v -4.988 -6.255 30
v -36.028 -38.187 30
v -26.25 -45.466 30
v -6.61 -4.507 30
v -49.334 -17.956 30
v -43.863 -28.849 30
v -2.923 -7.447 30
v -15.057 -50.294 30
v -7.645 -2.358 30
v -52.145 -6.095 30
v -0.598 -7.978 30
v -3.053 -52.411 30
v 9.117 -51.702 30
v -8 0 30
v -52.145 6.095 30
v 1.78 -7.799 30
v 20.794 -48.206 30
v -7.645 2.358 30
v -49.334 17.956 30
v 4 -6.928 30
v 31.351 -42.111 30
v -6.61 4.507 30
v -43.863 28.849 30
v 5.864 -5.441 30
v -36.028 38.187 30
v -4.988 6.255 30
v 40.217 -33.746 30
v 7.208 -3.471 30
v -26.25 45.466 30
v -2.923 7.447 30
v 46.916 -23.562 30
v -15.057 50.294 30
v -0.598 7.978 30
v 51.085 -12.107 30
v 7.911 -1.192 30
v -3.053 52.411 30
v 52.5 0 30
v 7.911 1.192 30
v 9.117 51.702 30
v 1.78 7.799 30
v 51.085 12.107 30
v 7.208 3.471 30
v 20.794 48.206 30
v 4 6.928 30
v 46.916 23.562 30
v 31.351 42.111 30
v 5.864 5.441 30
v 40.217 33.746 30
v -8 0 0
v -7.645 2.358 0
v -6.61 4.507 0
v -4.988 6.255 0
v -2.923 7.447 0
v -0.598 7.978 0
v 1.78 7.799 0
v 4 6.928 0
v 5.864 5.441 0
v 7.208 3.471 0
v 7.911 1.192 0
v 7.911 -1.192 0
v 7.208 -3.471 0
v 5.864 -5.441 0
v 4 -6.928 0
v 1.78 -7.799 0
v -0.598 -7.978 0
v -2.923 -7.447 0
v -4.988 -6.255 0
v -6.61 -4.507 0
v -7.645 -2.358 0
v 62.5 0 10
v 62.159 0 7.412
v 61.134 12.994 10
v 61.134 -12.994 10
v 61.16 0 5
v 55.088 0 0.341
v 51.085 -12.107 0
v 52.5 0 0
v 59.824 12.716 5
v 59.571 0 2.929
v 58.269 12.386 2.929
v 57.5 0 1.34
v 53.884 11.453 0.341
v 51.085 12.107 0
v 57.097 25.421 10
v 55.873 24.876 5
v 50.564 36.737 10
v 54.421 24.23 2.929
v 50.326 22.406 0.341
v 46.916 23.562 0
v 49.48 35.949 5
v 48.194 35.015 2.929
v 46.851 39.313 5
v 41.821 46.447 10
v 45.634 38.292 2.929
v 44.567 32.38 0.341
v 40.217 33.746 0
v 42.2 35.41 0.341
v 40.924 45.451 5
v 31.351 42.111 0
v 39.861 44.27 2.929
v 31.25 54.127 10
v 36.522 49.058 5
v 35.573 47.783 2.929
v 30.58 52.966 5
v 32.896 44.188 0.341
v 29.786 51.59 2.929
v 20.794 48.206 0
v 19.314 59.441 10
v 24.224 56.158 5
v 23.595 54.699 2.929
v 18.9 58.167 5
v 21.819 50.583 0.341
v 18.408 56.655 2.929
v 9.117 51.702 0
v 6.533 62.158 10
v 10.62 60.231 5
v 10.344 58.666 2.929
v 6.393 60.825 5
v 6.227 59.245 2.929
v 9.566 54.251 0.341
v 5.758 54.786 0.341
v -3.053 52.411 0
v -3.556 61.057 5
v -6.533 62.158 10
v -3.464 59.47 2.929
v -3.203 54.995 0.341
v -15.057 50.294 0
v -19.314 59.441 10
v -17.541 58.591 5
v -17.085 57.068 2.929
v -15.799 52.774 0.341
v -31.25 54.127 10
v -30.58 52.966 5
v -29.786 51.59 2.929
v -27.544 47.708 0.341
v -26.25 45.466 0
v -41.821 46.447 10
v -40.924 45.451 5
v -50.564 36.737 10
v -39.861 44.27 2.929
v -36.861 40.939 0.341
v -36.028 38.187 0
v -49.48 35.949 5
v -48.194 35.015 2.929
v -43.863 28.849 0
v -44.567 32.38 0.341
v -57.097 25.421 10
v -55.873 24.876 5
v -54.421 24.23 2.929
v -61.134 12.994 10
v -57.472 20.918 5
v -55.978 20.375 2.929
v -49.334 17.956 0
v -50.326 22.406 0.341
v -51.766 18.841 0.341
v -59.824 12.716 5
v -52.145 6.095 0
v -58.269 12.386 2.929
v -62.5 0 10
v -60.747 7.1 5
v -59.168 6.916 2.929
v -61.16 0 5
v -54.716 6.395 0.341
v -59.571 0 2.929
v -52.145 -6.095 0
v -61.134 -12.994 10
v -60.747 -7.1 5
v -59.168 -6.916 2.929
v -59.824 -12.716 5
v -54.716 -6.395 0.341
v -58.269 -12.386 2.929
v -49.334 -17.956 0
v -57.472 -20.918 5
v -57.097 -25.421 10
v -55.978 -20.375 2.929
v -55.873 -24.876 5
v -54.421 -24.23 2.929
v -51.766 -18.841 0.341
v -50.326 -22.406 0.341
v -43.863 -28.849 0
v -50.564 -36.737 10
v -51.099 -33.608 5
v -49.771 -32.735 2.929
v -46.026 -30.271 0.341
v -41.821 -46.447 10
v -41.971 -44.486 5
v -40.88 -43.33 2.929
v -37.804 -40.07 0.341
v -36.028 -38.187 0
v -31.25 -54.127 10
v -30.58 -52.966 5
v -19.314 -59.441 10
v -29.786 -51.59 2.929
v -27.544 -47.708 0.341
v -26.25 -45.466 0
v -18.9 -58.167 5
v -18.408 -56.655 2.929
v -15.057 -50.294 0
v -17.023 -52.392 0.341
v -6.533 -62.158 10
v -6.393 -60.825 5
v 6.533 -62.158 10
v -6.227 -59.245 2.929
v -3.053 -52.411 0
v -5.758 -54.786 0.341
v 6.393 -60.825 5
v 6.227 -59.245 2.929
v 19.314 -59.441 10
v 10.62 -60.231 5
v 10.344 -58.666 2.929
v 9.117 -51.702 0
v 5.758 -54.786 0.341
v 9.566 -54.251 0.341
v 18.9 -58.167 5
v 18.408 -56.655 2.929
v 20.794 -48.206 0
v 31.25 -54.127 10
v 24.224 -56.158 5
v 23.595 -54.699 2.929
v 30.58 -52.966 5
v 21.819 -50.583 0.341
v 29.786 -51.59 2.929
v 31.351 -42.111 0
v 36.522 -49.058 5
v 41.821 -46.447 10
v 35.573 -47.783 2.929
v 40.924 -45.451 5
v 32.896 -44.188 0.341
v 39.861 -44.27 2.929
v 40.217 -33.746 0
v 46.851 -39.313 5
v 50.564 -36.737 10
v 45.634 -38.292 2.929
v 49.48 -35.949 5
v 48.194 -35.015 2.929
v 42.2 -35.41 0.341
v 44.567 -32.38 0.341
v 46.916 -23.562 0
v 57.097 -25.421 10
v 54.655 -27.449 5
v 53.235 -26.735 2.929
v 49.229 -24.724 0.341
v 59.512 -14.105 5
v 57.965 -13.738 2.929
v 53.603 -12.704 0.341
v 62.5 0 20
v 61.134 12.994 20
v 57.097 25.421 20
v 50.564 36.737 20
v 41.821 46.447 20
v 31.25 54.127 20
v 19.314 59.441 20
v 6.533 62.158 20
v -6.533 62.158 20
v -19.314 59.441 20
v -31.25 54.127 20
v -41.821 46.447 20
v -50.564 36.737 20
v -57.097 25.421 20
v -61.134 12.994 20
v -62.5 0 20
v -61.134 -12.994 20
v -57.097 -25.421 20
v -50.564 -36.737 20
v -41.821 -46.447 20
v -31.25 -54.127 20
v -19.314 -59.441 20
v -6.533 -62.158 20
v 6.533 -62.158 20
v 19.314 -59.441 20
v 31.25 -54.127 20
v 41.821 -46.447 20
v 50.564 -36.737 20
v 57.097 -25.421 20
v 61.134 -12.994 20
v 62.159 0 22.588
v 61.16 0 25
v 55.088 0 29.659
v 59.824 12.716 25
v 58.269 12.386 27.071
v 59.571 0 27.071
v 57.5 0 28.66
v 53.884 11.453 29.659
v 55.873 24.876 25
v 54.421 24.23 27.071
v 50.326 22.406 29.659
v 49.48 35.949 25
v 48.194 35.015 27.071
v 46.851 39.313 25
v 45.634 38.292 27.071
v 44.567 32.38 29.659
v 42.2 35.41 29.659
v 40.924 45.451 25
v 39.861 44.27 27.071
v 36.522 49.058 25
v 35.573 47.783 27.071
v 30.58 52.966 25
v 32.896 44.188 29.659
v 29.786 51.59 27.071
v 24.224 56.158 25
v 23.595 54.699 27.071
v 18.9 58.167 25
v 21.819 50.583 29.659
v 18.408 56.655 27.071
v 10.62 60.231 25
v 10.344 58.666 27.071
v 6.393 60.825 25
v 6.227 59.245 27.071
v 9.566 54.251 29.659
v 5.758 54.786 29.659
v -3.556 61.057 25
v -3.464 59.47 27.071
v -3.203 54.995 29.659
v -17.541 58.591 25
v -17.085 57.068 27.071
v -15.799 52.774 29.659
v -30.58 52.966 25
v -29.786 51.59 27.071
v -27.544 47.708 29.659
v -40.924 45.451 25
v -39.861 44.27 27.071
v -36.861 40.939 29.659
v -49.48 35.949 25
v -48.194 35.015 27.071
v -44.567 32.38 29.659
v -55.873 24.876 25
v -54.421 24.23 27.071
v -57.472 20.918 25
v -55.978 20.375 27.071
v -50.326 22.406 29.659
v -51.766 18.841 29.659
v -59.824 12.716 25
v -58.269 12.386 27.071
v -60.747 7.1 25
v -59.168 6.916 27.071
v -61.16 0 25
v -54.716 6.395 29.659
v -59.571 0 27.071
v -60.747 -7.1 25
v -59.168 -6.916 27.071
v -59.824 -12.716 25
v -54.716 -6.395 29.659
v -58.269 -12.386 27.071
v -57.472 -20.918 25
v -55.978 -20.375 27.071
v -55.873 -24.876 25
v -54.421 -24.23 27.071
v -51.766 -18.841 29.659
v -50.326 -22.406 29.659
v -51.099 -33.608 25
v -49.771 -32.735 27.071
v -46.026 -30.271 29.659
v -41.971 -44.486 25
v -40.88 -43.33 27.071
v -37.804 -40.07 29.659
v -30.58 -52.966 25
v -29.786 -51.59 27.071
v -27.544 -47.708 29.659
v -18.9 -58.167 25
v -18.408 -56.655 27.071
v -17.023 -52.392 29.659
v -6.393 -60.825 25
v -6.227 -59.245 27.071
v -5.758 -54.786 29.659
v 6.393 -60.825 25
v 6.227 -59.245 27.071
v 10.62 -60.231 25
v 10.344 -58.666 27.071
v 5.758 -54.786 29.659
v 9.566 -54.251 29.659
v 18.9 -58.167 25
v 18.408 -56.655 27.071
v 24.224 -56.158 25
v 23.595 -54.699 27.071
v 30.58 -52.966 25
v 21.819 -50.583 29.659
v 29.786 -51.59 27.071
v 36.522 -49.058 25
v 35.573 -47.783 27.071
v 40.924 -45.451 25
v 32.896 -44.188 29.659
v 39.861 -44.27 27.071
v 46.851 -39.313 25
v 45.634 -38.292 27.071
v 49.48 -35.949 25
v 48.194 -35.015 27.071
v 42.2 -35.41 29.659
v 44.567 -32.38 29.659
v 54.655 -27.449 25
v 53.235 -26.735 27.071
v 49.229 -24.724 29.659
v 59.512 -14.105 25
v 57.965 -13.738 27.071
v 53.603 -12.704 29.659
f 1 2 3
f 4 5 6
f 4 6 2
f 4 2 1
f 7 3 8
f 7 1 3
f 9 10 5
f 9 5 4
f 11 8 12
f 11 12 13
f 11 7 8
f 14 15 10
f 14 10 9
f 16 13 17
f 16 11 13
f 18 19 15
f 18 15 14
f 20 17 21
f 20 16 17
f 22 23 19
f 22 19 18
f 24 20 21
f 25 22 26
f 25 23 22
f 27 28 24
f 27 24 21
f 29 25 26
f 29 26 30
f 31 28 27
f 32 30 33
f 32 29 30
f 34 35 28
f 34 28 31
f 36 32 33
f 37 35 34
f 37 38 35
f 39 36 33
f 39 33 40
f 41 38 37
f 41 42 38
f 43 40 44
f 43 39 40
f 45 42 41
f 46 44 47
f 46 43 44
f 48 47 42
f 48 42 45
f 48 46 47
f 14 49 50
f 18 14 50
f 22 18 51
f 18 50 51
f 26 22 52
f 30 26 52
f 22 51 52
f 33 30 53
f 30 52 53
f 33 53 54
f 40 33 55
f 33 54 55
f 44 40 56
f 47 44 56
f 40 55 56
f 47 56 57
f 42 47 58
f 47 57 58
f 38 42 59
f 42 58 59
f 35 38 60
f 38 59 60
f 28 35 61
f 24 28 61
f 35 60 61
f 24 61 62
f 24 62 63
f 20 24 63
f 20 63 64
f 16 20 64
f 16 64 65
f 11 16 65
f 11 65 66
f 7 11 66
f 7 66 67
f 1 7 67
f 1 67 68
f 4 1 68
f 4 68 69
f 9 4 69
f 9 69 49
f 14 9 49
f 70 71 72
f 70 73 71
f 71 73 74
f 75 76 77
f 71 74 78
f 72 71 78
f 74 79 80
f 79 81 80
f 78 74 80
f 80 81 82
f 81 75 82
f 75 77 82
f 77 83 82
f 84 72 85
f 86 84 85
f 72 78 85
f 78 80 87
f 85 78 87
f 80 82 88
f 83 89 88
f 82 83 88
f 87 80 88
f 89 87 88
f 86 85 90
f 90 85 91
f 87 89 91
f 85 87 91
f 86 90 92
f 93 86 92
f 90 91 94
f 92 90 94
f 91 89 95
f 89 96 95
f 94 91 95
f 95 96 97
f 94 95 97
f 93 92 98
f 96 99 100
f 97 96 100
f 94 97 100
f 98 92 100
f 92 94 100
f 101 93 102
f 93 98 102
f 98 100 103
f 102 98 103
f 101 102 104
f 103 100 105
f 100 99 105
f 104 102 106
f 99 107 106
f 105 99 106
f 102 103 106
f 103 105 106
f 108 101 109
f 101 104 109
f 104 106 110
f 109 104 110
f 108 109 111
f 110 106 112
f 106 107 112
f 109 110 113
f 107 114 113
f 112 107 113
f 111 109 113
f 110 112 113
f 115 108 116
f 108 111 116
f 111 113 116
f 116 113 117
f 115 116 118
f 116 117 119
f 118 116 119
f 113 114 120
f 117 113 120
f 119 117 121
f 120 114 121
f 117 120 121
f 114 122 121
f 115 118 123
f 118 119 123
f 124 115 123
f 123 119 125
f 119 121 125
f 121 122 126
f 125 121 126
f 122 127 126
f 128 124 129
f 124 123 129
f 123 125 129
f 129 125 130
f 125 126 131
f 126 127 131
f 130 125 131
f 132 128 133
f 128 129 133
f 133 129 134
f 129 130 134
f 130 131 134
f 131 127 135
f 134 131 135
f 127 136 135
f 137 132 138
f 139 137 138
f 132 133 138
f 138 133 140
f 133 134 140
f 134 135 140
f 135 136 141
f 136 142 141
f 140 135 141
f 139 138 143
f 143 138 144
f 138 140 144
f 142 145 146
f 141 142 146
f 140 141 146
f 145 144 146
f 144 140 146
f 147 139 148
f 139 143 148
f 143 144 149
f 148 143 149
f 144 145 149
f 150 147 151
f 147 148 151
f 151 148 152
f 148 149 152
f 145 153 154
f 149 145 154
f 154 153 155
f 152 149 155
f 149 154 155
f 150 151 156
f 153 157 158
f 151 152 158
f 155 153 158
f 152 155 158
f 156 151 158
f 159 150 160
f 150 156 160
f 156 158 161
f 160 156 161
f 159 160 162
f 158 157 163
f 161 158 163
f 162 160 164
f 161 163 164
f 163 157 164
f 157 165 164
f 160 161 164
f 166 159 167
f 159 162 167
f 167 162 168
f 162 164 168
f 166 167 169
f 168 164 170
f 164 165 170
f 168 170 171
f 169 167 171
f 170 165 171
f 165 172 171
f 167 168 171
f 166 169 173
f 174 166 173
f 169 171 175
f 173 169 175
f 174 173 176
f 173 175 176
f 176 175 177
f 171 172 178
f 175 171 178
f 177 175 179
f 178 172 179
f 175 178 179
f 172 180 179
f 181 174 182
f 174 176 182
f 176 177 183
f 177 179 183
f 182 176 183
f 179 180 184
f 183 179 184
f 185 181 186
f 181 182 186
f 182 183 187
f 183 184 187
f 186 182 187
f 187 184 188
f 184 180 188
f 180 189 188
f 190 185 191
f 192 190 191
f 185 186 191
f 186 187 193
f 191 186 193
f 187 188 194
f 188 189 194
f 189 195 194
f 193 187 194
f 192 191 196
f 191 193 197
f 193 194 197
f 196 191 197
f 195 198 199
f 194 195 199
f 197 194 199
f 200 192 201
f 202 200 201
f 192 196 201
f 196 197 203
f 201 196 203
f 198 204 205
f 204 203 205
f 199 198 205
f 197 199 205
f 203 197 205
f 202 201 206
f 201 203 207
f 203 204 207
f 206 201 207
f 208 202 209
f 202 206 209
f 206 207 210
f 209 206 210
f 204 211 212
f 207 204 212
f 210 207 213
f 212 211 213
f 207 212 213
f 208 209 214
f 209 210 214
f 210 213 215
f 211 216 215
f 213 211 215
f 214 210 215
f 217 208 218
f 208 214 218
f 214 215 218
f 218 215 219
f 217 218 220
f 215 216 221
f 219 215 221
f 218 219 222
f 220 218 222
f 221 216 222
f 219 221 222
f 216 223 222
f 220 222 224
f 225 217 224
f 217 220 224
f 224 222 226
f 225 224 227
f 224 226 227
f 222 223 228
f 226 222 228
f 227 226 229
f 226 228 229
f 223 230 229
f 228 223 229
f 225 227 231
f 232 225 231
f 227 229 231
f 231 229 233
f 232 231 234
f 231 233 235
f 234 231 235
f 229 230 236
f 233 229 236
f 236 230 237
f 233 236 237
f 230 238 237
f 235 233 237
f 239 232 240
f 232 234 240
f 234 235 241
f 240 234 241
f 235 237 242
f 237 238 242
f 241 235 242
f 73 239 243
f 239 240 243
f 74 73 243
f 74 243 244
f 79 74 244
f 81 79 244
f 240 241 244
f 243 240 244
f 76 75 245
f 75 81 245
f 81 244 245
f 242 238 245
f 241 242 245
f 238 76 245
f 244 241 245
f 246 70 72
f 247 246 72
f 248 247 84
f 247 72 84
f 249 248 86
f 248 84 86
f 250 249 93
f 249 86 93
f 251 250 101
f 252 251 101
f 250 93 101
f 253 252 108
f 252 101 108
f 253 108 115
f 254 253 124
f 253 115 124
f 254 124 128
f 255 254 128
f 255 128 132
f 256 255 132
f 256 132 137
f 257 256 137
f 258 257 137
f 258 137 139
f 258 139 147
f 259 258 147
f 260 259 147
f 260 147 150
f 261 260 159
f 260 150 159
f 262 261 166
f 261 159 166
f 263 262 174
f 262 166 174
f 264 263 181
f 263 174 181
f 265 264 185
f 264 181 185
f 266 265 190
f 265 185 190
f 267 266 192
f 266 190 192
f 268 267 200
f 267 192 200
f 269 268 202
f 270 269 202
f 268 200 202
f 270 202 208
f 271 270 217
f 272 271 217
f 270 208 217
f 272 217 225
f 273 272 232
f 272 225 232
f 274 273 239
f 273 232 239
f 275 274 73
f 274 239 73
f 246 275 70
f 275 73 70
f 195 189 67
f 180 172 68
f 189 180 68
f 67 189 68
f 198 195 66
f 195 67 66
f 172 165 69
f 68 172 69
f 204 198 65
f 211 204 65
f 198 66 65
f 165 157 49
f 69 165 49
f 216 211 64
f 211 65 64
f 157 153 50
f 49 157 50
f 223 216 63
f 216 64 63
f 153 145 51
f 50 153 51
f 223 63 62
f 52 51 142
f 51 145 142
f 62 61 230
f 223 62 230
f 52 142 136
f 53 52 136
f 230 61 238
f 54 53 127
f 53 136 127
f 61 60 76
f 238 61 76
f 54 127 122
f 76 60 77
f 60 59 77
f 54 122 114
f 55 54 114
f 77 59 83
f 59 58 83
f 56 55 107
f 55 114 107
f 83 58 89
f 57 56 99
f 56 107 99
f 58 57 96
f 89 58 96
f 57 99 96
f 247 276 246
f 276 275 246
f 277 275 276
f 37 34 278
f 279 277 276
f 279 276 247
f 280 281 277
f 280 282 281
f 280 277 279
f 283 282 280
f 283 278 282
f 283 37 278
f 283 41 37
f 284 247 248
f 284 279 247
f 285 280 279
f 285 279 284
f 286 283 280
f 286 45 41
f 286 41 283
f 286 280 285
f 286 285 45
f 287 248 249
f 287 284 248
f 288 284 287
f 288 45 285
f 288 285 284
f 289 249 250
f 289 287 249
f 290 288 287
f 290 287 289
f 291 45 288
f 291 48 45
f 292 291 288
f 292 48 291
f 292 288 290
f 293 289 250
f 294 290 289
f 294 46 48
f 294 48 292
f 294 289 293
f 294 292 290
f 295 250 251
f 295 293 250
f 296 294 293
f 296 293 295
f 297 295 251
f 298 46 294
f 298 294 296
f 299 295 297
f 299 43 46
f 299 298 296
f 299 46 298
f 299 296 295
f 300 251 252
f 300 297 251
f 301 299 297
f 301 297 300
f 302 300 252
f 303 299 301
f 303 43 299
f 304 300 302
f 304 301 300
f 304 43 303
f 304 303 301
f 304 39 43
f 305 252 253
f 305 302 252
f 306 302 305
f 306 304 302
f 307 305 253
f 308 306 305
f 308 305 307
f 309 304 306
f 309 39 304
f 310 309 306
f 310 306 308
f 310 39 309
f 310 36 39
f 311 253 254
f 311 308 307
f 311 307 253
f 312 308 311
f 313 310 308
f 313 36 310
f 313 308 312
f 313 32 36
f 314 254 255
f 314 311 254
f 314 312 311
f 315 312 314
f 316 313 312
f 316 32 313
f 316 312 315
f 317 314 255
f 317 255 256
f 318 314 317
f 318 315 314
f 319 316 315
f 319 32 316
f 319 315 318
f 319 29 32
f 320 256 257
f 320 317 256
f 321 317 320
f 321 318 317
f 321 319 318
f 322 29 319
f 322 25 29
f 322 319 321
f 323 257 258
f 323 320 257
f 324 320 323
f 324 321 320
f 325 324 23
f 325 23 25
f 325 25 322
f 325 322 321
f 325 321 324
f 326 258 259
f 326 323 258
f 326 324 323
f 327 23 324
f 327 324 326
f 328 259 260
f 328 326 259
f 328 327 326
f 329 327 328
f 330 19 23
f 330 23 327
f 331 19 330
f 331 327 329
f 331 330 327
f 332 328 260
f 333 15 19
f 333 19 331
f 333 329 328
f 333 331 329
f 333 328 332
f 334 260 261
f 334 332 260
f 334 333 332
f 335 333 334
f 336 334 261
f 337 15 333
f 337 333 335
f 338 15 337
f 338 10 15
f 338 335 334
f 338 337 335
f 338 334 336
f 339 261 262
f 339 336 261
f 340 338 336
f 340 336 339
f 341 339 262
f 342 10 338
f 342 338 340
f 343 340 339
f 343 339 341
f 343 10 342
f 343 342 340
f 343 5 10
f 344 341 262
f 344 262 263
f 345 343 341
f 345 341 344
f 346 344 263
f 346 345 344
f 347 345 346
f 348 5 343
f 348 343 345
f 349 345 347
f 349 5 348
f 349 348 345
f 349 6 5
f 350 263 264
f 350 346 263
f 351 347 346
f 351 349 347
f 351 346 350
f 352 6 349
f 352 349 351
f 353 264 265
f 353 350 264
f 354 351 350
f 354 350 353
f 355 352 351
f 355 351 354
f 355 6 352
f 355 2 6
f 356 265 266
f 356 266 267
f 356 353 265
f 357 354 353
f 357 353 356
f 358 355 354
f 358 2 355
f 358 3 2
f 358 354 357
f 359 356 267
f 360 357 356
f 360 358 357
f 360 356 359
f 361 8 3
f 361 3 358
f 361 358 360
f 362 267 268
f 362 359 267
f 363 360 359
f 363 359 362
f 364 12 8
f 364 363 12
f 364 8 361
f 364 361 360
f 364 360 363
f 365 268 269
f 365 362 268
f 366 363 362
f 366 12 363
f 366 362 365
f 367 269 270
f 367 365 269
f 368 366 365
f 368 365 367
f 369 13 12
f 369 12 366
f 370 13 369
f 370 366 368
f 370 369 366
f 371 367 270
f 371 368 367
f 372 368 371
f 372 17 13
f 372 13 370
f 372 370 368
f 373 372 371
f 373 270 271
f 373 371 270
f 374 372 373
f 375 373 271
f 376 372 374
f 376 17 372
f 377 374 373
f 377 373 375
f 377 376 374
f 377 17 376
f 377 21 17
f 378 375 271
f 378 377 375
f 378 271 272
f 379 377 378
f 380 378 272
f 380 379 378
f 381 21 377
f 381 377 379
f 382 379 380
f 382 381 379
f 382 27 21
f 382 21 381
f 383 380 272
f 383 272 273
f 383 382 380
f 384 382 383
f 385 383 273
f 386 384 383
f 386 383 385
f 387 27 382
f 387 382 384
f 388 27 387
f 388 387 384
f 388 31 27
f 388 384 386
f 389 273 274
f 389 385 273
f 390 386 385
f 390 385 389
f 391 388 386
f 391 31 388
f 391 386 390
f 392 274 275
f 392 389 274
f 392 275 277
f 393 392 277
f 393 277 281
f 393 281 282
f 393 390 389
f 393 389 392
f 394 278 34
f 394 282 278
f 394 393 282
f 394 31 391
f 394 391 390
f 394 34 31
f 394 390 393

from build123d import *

# Parameters (mm, degrees)
SKETCH_2_R          = 62.5
EXTRUDE_1_DEPTH     = 30
FILLET_1_R          = 10
SKETCH_3_R          = 8
CUT_EXTRUDE_1_DEPTH = 31


with BuildPart() as part:
    # 草图2 → 凸台-拉伸1 (new body)
    with BuildSketch(Plane.XY):
        Circle(SKETCH_2_R)
    extrude(amount=EXTRUDE_1_DEPTH)

    # 圆角1
    fillet_1_edges = [part.edges().sort_by_distance(p)[0] for p in [
        (-62.5, 0, 0),
        (-62.5, 0, 30),
    ]]
    fillet(fillet_1_edges, radius=FILLET_1_R)

    # 草图3 → 切除-拉伸1 (cut, through all)
    with BuildSketch(Plane(origin=(0, 0, 0), x_dir=(-1, 0, 0), z_dir=(0, 0, -1))):
        Circle(SKETCH_3_R)
    extrude(amount=-CUT_EXTRUDE_1_DEPTH, mode=Mode.SUBTRACT)


solid = part.part
